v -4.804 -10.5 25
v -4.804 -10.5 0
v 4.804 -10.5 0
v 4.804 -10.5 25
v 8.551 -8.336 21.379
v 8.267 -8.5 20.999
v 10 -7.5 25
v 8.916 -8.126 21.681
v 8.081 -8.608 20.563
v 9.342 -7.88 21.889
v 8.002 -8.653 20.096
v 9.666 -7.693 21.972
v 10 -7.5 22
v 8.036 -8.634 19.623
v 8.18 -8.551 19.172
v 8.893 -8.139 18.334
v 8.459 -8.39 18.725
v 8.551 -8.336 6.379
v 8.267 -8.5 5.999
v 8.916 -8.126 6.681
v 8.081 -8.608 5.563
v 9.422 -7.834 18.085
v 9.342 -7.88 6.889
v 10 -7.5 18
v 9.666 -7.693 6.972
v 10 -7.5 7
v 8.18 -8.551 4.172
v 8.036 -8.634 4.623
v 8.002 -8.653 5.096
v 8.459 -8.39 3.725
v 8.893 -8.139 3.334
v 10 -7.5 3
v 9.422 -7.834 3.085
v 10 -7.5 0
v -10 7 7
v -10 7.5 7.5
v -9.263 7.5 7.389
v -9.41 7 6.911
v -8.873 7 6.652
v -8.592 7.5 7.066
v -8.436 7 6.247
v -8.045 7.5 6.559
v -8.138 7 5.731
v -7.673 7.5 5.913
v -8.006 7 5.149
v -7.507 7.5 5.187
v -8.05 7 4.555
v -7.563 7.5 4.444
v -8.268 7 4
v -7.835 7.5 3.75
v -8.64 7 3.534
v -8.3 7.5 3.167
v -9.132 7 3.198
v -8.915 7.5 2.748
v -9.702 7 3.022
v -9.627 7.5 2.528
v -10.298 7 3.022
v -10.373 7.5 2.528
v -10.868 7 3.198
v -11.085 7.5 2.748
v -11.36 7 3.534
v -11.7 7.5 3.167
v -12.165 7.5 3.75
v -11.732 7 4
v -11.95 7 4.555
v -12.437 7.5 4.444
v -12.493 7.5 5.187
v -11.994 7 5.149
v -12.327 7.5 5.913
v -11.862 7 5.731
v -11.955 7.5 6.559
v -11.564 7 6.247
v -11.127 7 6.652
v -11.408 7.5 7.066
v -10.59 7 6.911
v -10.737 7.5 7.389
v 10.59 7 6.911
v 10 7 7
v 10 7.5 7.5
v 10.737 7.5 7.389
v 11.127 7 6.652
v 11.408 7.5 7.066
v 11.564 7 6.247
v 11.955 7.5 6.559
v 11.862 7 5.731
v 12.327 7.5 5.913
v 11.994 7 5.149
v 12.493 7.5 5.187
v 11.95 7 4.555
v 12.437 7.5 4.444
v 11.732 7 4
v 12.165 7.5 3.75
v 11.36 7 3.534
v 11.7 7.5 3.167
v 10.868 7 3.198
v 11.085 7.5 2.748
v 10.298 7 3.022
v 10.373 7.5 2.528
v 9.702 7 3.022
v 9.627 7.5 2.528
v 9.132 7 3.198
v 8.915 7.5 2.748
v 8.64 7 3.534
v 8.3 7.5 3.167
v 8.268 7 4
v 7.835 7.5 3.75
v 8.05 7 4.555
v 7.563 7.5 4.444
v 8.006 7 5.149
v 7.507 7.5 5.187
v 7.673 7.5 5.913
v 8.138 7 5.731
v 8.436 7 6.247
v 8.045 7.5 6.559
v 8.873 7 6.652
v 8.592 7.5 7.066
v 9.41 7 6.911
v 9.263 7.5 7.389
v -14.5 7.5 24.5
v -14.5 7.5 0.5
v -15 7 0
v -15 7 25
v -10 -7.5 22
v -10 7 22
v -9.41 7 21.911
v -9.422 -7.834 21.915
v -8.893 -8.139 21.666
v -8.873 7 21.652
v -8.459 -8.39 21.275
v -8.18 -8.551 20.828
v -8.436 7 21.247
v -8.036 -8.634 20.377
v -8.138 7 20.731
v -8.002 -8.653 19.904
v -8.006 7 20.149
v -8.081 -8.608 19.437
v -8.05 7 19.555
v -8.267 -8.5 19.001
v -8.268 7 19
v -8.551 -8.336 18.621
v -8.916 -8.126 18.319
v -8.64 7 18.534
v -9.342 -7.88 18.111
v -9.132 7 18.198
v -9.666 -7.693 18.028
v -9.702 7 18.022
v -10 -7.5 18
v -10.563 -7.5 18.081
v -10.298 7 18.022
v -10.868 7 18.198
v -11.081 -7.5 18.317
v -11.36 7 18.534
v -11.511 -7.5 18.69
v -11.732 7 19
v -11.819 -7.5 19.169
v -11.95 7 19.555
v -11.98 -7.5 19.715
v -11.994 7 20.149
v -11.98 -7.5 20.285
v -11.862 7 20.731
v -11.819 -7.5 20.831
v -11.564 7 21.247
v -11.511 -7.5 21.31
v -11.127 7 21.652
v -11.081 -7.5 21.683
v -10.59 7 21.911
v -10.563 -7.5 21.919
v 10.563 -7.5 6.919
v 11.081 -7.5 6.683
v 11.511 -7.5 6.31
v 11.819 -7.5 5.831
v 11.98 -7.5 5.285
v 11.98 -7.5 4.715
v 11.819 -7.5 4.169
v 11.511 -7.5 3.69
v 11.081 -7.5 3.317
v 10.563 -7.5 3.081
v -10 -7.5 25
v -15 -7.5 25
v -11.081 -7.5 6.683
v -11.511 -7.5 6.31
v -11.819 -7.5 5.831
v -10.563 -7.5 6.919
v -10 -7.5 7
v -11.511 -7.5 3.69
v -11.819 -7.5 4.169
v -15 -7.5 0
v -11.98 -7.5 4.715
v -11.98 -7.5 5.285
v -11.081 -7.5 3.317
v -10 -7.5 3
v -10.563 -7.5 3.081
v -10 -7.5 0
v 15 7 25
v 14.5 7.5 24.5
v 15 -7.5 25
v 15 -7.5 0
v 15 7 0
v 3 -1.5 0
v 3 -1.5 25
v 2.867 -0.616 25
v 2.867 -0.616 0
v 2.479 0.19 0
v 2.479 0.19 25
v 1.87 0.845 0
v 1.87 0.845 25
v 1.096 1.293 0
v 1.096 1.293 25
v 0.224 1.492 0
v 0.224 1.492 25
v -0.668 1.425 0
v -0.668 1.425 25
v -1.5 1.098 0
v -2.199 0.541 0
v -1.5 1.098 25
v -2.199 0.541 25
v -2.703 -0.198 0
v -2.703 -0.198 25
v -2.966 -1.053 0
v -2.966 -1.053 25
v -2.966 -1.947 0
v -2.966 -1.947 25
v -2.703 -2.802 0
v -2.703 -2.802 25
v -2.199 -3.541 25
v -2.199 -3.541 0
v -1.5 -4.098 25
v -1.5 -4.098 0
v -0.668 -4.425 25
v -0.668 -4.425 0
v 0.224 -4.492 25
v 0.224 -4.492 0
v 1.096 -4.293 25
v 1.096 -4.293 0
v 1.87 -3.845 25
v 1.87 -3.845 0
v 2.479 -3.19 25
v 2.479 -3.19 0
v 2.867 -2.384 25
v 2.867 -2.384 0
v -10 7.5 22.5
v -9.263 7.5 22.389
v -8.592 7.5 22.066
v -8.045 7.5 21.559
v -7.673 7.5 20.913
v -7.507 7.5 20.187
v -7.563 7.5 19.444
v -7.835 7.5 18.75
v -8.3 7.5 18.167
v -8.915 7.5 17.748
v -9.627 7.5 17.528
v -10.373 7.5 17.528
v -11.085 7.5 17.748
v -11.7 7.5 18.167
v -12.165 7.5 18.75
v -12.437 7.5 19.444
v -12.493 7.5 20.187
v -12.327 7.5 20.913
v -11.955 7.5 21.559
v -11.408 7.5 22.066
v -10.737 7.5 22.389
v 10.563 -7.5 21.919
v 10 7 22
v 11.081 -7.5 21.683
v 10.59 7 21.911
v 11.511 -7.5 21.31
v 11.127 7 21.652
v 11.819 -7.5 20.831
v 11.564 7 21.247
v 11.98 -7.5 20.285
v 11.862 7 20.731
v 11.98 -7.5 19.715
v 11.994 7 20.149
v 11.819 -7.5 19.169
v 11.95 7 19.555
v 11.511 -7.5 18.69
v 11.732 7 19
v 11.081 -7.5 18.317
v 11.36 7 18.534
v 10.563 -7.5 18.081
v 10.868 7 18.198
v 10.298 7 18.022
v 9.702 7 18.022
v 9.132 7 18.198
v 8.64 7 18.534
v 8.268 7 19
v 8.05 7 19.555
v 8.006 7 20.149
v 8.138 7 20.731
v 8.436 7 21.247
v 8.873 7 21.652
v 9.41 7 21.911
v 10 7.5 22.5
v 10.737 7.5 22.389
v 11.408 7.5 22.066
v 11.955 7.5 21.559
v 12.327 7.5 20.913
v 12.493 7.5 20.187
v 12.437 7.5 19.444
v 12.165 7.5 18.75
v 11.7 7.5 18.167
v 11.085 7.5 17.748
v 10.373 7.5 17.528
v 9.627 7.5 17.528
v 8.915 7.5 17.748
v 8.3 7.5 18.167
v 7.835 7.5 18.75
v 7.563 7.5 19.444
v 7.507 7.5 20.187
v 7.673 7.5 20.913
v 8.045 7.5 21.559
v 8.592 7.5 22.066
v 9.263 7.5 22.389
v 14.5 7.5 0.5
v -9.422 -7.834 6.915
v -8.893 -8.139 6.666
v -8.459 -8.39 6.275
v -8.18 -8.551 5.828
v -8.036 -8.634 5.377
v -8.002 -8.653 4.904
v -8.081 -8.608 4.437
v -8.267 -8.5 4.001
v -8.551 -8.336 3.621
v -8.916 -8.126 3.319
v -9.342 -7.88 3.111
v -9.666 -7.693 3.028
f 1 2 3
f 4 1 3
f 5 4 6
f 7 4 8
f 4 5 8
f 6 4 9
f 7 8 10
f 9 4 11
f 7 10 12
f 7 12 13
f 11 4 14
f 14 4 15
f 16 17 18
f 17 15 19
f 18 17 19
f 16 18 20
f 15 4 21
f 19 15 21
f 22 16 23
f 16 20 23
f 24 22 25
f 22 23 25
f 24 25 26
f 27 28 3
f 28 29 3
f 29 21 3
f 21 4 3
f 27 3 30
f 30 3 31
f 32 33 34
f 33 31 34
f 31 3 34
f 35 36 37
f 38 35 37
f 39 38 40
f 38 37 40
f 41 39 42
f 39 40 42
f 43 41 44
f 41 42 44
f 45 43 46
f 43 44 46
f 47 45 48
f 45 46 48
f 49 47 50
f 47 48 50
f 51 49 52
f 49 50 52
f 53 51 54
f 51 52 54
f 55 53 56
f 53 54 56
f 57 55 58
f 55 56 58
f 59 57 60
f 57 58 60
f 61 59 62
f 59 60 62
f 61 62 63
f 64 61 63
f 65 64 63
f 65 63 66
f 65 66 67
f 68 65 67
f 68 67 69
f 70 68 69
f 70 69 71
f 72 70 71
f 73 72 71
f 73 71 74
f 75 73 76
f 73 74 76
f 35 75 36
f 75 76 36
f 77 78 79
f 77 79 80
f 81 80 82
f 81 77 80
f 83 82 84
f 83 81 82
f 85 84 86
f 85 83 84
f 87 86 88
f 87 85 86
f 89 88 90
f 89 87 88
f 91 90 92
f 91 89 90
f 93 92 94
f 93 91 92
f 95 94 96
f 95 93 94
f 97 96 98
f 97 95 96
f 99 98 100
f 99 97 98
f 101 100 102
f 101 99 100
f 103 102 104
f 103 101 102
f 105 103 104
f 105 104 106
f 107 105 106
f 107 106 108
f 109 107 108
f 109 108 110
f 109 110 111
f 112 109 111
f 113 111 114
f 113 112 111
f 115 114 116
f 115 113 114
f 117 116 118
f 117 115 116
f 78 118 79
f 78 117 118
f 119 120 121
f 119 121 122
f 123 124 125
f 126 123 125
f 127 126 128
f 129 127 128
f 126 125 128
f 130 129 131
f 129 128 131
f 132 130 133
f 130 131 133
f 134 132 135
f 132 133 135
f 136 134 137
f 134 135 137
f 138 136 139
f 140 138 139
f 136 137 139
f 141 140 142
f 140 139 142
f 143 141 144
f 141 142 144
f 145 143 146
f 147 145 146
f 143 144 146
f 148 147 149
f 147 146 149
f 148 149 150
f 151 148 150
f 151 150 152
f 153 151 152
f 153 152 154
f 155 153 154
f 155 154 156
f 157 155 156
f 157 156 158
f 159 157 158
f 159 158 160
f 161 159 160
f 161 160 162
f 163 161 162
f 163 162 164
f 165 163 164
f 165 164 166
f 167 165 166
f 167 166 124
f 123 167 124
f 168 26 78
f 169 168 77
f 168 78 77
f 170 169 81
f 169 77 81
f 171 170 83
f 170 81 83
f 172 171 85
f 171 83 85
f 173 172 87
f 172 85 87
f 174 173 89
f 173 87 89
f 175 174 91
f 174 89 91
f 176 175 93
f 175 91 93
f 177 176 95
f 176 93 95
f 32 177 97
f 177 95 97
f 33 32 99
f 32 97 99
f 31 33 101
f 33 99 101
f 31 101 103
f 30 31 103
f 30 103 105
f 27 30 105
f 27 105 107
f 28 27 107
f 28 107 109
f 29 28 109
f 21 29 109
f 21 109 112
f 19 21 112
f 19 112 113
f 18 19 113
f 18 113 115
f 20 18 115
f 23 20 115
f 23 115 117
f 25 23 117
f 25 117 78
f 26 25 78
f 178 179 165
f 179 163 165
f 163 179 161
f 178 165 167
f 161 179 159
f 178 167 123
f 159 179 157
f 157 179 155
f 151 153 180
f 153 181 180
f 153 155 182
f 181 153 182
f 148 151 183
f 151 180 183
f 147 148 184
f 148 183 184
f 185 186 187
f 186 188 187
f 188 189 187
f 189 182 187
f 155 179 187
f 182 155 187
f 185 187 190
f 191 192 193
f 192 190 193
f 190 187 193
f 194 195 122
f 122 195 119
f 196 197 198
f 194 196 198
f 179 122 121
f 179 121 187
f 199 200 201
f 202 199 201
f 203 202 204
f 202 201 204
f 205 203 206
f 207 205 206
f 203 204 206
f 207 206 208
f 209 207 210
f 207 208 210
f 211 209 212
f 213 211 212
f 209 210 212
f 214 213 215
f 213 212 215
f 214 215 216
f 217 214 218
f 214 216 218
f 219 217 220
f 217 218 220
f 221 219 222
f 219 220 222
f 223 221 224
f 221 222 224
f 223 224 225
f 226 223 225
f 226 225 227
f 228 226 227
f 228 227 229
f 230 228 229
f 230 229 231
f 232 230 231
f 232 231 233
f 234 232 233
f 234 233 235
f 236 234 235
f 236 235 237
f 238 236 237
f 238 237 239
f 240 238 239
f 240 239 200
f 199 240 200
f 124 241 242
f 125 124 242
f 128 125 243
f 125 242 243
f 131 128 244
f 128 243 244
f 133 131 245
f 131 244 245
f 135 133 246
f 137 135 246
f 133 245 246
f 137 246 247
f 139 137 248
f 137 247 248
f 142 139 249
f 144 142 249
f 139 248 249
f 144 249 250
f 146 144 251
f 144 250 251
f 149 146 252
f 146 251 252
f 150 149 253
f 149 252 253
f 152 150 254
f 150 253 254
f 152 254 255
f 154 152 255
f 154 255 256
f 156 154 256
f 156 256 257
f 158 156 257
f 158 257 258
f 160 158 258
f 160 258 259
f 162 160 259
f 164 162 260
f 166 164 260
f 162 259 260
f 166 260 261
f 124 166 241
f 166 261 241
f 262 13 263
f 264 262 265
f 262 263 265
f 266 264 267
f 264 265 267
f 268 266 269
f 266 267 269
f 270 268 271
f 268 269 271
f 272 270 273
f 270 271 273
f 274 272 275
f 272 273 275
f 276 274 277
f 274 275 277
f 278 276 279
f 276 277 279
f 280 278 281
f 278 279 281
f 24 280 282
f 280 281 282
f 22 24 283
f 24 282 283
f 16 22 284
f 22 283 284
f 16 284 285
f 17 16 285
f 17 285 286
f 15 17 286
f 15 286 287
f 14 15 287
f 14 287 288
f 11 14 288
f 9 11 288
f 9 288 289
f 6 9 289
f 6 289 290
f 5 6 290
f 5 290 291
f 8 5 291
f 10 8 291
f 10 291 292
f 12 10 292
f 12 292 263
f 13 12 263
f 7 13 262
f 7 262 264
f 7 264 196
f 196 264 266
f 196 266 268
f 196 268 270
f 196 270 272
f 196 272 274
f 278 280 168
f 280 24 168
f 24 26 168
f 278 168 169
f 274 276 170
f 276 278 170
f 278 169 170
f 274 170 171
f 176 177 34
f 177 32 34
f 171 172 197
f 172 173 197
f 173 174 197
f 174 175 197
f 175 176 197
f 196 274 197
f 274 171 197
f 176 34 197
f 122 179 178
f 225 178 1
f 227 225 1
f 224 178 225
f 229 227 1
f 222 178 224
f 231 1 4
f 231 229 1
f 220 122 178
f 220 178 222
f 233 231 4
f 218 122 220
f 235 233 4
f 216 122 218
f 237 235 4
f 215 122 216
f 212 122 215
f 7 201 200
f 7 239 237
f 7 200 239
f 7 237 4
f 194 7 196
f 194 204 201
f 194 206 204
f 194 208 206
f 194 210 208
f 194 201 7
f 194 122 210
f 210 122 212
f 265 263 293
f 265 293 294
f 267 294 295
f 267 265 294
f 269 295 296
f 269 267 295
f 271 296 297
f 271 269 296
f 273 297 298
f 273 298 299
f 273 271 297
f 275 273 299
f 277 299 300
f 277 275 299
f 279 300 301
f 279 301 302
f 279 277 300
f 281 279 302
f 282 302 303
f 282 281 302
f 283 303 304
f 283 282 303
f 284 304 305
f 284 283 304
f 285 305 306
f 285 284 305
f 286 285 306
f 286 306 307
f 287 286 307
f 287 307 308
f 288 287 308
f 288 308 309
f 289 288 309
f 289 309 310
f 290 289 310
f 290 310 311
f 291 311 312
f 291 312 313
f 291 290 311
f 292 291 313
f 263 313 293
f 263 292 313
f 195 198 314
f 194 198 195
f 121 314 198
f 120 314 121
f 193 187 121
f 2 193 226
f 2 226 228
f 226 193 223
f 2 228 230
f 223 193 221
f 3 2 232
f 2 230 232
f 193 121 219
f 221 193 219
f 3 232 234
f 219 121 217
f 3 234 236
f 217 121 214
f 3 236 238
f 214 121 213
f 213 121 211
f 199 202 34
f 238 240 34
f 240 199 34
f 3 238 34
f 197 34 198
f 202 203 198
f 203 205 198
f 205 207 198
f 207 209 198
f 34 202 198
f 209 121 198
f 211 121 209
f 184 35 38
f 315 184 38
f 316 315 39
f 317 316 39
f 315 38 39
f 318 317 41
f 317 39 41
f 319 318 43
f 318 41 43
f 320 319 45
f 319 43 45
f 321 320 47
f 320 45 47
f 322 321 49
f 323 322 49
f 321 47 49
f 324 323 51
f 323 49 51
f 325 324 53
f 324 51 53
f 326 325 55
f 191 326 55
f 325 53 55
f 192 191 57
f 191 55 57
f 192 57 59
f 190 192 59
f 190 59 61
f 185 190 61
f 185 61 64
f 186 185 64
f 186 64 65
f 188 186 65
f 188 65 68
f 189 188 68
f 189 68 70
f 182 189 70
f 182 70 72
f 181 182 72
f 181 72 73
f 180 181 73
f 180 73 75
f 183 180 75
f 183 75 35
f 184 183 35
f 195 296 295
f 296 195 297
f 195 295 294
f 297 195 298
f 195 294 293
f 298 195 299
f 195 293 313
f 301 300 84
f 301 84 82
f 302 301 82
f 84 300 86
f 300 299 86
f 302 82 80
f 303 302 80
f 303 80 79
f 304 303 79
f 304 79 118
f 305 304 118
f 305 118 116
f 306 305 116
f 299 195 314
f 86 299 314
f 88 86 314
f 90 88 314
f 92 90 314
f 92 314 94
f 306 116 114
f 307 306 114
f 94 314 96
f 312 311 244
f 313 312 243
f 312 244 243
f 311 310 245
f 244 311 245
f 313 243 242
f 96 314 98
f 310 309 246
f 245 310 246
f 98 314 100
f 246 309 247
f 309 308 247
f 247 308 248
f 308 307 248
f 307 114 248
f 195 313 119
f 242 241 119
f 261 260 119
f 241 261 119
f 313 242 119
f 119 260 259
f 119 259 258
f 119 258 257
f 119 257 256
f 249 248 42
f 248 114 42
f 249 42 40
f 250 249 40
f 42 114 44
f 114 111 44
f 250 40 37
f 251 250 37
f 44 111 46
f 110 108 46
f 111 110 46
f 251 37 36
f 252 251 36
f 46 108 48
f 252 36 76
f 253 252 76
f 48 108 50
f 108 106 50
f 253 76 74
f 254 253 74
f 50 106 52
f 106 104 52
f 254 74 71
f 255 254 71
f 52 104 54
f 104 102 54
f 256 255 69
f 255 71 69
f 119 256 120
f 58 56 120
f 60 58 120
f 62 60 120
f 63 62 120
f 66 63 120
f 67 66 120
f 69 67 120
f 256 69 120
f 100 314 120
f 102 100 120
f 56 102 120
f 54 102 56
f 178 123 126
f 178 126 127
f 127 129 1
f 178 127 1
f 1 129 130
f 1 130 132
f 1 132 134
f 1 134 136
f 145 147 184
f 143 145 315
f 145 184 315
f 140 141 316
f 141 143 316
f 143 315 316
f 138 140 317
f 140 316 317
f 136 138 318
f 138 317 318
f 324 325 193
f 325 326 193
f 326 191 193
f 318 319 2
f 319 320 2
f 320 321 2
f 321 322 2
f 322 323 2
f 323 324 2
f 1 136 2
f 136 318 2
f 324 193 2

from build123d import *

# Parameters (mm, degrees)
EXTRUDE_1_DEPTH     = 25
SKETCH_2_R          = 2
CUT_EXTRUDE_1_DEPTH = 35.263683398
SKETCH_3_R          = 3
CUT_EXTRUDE_2_DEPTH = 31.987900865
CHAMFER_1_SIZE      = 0.5


with BuildPart() as part:
    # 스케치1 → 보스-돌출1 (new body)
    with BuildSketch(Plane.XY):
        Polygon((-15, -7.5), (-10, -7.5), (-4.803847577, -10.5), (4.803847577, -10.5), (10, -7.5), (15, -7.5), (15, 7.5), (-15, 7.5), align=None)
    extrude(amount=EXTRUDE_1_DEPTH)

    # 스케치2 → 컷-돌출1 (cut, through all)
    with BuildSketch(Plane(origin=(0, 7.5, 0), x_dir=(1, 0, 0), z_dir=(0, 1, 0))):
        with Locations(Location((-10, -5, 0), (0, 0, 270))):
            Circle(SKETCH_2_R)
        with Locations(Location((-10, -20, 0), (0, 0, 270))):
            Circle(SKETCH_2_R)
        with Locations(Location((10, -20, 0), (0, 0, 270))):
            Circle(SKETCH_2_R)
        with Locations(Location((10, -5, 0), (0, 0, 270))):
            Circle(SKETCH_2_R)
    extrude(amount=-CUT_EXTRUDE_1_DEPTH, mode=Mode.SUBTRACT)

    # 스케치3 → 컷-돌출2 (cut, through all)
    with BuildSketch(Plane.XY.offset(25)):
        with Locations((0, -1.5)):
            Circle(SKETCH_3_R)
    extrude(amount=-CUT_EXTRUDE_2_DEPTH, mode=Mode.SUBTRACT)

    # 모따기1
    chamfer_1_edges = [part.edges().sort_by_distance(p)[0] for p in [
        (0, 7.5, 0),
        (-15, 7.5, 12.5),
        (15, 7.5, 12.5),
        (-10, 7.5, 3),
        (-10, 7.5, 18),
        (10, 7.5, 18),
        (10, 7.5, 3),
        (0, 7.5, 25),
    ]]
    chamfer(chamfer_1_edges, length=CHAMFER_1_SIZE)


solid = part.part
